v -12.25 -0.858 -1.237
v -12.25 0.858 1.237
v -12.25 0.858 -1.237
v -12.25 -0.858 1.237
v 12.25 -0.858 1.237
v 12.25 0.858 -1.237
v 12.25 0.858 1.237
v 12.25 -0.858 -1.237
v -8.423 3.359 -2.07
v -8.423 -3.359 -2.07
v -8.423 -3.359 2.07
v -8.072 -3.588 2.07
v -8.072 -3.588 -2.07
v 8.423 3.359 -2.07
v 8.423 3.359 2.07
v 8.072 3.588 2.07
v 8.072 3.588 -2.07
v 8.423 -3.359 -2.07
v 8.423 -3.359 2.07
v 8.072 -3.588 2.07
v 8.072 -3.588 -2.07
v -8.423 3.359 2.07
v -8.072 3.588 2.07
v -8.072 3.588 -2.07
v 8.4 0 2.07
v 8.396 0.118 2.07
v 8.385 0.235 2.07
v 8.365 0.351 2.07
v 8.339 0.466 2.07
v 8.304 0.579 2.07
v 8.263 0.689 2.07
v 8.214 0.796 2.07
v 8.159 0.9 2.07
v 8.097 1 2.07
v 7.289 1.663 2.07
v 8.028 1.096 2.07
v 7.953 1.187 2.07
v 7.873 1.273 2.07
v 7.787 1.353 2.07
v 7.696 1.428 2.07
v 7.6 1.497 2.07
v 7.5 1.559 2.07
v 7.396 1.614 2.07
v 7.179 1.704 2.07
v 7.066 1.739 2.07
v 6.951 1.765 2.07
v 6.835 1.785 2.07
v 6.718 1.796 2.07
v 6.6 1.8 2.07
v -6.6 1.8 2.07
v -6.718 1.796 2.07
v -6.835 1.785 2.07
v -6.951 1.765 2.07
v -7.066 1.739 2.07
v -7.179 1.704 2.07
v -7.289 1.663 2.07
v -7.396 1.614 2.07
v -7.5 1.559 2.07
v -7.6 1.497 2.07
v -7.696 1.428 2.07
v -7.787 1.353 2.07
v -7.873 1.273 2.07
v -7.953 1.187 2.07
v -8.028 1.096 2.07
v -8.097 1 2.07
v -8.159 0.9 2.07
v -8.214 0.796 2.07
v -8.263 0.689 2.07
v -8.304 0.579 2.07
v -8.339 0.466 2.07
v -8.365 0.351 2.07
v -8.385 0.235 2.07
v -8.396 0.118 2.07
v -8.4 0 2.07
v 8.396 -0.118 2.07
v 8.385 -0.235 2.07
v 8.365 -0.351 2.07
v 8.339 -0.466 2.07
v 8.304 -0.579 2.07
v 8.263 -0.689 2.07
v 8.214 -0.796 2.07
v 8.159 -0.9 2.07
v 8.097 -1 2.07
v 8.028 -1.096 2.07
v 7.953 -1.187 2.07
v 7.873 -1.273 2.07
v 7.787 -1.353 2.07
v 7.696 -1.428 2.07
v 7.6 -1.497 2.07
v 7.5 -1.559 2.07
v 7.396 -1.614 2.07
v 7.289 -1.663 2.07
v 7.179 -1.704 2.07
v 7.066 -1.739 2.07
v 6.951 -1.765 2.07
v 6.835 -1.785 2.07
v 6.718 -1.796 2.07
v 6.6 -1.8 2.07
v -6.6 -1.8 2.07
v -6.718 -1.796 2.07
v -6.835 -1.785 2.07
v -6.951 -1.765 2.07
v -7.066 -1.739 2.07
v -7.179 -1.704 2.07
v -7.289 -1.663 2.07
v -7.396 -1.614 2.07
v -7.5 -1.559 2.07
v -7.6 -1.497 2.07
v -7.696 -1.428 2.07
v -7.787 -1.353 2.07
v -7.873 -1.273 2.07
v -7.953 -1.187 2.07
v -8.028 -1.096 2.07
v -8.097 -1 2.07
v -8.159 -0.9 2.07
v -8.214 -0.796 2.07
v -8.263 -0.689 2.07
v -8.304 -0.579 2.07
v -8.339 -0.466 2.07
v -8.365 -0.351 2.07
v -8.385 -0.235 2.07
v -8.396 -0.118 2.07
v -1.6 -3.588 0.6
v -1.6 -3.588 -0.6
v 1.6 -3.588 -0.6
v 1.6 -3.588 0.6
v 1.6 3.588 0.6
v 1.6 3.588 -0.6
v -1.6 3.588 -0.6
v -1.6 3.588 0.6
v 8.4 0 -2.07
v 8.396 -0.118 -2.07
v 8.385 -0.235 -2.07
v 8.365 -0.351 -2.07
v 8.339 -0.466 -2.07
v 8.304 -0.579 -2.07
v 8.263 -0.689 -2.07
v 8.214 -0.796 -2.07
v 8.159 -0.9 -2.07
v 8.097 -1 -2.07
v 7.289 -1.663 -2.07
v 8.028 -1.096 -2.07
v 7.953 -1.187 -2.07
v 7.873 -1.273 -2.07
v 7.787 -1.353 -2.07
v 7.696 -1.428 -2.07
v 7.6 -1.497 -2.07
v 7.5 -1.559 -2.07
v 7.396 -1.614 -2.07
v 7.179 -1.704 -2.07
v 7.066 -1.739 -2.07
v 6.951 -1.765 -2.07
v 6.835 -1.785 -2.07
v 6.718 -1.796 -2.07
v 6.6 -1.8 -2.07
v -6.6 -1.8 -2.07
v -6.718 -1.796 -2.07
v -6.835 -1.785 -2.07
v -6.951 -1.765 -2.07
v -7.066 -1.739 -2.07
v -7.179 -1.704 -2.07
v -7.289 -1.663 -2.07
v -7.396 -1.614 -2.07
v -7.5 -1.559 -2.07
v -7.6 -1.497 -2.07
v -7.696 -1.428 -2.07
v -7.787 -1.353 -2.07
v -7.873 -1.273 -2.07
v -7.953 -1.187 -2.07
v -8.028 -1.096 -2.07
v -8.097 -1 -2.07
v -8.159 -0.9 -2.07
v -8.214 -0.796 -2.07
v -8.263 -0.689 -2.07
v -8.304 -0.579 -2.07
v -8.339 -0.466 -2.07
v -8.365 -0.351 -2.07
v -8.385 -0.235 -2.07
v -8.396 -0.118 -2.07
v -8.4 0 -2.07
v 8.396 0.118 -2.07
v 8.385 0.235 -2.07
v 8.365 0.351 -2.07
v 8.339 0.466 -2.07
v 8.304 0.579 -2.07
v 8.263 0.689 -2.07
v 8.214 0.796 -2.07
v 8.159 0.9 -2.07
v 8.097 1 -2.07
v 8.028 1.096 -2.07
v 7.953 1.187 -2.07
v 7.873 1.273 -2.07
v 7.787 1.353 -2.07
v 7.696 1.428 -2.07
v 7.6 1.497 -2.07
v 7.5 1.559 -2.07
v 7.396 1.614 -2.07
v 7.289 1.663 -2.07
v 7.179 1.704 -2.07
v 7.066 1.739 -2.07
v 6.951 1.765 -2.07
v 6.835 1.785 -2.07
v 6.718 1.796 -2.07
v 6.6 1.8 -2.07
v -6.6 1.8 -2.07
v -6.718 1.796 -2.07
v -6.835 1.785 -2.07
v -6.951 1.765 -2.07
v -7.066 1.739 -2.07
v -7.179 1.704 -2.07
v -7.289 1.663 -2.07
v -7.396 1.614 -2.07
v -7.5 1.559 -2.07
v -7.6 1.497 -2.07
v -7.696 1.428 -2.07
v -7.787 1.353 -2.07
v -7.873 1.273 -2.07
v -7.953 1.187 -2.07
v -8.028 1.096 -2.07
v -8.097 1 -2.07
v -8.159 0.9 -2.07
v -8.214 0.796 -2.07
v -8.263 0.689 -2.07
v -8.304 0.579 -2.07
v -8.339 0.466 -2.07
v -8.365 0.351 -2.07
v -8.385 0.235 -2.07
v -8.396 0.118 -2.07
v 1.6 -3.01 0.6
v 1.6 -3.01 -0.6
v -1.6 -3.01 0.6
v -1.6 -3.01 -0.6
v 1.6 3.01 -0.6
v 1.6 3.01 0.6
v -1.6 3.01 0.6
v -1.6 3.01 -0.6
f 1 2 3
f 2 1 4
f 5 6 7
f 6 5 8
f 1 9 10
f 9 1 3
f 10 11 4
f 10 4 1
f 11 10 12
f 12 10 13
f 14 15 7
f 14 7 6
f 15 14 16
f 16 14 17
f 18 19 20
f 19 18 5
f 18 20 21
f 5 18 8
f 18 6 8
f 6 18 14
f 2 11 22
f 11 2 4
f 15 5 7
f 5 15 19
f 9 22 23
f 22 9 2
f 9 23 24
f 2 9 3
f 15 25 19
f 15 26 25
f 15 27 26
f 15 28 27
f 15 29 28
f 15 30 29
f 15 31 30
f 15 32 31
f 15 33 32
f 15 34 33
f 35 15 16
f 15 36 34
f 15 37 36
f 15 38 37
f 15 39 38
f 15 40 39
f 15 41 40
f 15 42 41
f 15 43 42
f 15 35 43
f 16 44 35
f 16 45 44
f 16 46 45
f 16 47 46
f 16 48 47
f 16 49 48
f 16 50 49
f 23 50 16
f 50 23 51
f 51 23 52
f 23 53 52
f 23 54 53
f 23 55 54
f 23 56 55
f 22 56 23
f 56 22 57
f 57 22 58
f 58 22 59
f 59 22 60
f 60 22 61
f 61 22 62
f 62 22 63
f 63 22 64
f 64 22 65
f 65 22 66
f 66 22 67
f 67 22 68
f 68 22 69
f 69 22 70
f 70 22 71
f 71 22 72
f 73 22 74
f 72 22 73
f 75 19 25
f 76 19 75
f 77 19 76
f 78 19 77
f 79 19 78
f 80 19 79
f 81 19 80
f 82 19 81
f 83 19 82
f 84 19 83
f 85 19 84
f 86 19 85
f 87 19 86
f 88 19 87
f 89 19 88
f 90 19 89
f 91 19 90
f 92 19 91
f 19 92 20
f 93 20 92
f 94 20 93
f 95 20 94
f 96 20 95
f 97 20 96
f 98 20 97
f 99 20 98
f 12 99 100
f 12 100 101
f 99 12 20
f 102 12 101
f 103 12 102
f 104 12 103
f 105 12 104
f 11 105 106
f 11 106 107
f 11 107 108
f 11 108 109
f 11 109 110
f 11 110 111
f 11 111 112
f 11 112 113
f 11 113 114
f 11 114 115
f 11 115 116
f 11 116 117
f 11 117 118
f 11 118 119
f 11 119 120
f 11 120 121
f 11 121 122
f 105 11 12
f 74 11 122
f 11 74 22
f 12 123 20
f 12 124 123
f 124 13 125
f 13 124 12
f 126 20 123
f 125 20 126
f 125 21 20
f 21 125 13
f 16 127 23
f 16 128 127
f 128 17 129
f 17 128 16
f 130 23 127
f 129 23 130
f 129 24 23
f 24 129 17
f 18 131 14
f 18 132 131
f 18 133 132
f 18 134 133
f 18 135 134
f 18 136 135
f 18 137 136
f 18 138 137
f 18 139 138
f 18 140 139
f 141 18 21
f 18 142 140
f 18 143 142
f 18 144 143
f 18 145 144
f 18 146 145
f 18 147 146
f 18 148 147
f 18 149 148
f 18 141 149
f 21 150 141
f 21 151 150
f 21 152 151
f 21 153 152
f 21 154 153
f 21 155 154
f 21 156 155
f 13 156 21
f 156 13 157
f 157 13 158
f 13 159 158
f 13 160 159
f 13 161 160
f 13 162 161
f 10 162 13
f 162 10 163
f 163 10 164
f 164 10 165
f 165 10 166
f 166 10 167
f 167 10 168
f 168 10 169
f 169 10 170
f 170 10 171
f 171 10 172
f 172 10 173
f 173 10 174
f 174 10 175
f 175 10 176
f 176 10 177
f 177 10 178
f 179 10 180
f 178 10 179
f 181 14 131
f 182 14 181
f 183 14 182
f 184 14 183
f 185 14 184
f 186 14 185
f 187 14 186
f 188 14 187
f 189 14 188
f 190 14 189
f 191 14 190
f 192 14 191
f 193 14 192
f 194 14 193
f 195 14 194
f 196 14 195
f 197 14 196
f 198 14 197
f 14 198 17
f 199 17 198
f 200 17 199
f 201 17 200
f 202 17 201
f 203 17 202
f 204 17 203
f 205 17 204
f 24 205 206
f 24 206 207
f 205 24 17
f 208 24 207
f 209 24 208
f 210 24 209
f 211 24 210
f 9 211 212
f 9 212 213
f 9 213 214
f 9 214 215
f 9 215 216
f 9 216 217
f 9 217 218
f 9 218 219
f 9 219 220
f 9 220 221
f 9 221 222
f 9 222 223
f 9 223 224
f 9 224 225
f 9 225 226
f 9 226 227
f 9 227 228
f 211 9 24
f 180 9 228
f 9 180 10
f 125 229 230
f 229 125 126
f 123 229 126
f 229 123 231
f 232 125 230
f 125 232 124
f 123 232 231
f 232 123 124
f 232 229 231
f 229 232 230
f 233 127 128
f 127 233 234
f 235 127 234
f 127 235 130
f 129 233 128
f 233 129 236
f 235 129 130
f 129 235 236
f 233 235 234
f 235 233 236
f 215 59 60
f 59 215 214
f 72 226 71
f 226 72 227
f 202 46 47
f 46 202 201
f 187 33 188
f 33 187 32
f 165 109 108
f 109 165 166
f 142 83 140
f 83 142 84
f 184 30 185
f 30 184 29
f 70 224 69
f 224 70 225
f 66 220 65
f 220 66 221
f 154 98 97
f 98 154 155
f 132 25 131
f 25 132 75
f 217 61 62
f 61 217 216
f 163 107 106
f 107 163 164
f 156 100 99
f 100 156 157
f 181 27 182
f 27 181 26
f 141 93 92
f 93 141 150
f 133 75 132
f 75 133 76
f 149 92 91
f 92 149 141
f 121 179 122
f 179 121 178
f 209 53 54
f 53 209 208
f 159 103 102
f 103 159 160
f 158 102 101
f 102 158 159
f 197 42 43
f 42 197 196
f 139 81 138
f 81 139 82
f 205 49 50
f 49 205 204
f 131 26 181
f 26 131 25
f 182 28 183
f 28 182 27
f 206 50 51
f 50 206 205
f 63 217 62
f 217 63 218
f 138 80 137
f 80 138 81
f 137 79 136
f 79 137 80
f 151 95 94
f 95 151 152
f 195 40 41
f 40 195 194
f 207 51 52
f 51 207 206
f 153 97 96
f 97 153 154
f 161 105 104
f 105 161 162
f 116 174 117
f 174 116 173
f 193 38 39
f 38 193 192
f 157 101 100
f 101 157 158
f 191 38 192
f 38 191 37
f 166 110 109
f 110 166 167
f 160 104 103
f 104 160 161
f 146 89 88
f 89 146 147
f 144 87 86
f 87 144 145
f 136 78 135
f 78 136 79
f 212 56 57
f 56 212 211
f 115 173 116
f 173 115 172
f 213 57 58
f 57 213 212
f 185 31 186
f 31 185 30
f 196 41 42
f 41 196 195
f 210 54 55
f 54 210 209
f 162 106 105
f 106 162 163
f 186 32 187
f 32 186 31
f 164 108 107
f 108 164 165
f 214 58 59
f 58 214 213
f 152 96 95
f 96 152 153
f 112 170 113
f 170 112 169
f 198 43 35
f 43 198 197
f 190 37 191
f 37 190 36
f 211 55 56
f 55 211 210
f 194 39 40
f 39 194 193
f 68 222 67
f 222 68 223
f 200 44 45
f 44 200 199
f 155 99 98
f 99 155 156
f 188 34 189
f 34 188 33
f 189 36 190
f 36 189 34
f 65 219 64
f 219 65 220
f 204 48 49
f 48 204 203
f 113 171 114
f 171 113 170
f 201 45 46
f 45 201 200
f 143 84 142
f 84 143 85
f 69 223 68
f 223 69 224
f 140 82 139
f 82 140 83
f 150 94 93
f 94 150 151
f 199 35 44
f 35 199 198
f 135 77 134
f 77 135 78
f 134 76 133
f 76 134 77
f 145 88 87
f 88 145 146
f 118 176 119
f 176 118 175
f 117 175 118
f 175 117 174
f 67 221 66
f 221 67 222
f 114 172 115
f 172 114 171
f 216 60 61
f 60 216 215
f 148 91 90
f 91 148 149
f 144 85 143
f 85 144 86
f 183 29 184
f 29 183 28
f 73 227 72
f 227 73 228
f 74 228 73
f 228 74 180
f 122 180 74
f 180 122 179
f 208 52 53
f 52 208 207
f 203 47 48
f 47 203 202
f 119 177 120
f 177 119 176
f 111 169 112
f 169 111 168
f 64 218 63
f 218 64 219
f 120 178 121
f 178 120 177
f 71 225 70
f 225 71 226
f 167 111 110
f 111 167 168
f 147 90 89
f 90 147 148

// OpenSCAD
$fn=96;

L = 24.5;
W = 7.8;
T = 4.5;

slot_L = 16.8;
slot_W = 3.6;

notch_L = 3.2;
notch_H = 1.2;
notch_D = 0.9;

module spindle_outer(len=L, wid=W, th=T) {
    hull() {
        translate([0,0,0]) cube([len*0.62, wid, th], center=true);
        translate([ len/2 - 0.35, 0, 0]) cube([0.7, wid*0.22, th*0.55], center=true);
        translate([-len/2 + 0.35, 0, 0]) cube([0.7, wid*0.22, th*0.55], center=true);
    }
}

module chamfered_body(len=L, wid=W, th=T) {
    intersection() {
        spindle_outer(len,wid,th);
        hull() {
            translate([0,0,0]) cube([len*0.70, wid*0.92, th*0.92], center=true);
            translate([ len/2 - 0.55, 0, 0]) cube([1.1, wid*0.30, th*0.55], center=true);
            translate([-len/2 + 0.55, 0, 0]) cube([1.1, wid*0.30, th*0.55], center=true);
        }
    }
}

module rounded_slot(len=slot_L, wid=slot_W, th=T+0.6) {
    hull() {
        translate([ len/2 - wid/2, 0, 0]) cylinder(h=th, r=wid/2, center=true);
        translate([-len/2 + wid/2, 0, 0]) cylinder(h=th, r=wid/2, center=true);
    }
}

module side_notches() {
    for (sx=[-1,1]) {
        translate([0, sx*(W/2 - notch_D/2 + 0.01), 0])
            cube([notch_L, notch_D, notch_H], center=true);
    }
}

difference() {
    chamfered_body(L,W,T);
    rounded_slot(slot_L, slot_W, T+0.8);
    side_notches();
}
